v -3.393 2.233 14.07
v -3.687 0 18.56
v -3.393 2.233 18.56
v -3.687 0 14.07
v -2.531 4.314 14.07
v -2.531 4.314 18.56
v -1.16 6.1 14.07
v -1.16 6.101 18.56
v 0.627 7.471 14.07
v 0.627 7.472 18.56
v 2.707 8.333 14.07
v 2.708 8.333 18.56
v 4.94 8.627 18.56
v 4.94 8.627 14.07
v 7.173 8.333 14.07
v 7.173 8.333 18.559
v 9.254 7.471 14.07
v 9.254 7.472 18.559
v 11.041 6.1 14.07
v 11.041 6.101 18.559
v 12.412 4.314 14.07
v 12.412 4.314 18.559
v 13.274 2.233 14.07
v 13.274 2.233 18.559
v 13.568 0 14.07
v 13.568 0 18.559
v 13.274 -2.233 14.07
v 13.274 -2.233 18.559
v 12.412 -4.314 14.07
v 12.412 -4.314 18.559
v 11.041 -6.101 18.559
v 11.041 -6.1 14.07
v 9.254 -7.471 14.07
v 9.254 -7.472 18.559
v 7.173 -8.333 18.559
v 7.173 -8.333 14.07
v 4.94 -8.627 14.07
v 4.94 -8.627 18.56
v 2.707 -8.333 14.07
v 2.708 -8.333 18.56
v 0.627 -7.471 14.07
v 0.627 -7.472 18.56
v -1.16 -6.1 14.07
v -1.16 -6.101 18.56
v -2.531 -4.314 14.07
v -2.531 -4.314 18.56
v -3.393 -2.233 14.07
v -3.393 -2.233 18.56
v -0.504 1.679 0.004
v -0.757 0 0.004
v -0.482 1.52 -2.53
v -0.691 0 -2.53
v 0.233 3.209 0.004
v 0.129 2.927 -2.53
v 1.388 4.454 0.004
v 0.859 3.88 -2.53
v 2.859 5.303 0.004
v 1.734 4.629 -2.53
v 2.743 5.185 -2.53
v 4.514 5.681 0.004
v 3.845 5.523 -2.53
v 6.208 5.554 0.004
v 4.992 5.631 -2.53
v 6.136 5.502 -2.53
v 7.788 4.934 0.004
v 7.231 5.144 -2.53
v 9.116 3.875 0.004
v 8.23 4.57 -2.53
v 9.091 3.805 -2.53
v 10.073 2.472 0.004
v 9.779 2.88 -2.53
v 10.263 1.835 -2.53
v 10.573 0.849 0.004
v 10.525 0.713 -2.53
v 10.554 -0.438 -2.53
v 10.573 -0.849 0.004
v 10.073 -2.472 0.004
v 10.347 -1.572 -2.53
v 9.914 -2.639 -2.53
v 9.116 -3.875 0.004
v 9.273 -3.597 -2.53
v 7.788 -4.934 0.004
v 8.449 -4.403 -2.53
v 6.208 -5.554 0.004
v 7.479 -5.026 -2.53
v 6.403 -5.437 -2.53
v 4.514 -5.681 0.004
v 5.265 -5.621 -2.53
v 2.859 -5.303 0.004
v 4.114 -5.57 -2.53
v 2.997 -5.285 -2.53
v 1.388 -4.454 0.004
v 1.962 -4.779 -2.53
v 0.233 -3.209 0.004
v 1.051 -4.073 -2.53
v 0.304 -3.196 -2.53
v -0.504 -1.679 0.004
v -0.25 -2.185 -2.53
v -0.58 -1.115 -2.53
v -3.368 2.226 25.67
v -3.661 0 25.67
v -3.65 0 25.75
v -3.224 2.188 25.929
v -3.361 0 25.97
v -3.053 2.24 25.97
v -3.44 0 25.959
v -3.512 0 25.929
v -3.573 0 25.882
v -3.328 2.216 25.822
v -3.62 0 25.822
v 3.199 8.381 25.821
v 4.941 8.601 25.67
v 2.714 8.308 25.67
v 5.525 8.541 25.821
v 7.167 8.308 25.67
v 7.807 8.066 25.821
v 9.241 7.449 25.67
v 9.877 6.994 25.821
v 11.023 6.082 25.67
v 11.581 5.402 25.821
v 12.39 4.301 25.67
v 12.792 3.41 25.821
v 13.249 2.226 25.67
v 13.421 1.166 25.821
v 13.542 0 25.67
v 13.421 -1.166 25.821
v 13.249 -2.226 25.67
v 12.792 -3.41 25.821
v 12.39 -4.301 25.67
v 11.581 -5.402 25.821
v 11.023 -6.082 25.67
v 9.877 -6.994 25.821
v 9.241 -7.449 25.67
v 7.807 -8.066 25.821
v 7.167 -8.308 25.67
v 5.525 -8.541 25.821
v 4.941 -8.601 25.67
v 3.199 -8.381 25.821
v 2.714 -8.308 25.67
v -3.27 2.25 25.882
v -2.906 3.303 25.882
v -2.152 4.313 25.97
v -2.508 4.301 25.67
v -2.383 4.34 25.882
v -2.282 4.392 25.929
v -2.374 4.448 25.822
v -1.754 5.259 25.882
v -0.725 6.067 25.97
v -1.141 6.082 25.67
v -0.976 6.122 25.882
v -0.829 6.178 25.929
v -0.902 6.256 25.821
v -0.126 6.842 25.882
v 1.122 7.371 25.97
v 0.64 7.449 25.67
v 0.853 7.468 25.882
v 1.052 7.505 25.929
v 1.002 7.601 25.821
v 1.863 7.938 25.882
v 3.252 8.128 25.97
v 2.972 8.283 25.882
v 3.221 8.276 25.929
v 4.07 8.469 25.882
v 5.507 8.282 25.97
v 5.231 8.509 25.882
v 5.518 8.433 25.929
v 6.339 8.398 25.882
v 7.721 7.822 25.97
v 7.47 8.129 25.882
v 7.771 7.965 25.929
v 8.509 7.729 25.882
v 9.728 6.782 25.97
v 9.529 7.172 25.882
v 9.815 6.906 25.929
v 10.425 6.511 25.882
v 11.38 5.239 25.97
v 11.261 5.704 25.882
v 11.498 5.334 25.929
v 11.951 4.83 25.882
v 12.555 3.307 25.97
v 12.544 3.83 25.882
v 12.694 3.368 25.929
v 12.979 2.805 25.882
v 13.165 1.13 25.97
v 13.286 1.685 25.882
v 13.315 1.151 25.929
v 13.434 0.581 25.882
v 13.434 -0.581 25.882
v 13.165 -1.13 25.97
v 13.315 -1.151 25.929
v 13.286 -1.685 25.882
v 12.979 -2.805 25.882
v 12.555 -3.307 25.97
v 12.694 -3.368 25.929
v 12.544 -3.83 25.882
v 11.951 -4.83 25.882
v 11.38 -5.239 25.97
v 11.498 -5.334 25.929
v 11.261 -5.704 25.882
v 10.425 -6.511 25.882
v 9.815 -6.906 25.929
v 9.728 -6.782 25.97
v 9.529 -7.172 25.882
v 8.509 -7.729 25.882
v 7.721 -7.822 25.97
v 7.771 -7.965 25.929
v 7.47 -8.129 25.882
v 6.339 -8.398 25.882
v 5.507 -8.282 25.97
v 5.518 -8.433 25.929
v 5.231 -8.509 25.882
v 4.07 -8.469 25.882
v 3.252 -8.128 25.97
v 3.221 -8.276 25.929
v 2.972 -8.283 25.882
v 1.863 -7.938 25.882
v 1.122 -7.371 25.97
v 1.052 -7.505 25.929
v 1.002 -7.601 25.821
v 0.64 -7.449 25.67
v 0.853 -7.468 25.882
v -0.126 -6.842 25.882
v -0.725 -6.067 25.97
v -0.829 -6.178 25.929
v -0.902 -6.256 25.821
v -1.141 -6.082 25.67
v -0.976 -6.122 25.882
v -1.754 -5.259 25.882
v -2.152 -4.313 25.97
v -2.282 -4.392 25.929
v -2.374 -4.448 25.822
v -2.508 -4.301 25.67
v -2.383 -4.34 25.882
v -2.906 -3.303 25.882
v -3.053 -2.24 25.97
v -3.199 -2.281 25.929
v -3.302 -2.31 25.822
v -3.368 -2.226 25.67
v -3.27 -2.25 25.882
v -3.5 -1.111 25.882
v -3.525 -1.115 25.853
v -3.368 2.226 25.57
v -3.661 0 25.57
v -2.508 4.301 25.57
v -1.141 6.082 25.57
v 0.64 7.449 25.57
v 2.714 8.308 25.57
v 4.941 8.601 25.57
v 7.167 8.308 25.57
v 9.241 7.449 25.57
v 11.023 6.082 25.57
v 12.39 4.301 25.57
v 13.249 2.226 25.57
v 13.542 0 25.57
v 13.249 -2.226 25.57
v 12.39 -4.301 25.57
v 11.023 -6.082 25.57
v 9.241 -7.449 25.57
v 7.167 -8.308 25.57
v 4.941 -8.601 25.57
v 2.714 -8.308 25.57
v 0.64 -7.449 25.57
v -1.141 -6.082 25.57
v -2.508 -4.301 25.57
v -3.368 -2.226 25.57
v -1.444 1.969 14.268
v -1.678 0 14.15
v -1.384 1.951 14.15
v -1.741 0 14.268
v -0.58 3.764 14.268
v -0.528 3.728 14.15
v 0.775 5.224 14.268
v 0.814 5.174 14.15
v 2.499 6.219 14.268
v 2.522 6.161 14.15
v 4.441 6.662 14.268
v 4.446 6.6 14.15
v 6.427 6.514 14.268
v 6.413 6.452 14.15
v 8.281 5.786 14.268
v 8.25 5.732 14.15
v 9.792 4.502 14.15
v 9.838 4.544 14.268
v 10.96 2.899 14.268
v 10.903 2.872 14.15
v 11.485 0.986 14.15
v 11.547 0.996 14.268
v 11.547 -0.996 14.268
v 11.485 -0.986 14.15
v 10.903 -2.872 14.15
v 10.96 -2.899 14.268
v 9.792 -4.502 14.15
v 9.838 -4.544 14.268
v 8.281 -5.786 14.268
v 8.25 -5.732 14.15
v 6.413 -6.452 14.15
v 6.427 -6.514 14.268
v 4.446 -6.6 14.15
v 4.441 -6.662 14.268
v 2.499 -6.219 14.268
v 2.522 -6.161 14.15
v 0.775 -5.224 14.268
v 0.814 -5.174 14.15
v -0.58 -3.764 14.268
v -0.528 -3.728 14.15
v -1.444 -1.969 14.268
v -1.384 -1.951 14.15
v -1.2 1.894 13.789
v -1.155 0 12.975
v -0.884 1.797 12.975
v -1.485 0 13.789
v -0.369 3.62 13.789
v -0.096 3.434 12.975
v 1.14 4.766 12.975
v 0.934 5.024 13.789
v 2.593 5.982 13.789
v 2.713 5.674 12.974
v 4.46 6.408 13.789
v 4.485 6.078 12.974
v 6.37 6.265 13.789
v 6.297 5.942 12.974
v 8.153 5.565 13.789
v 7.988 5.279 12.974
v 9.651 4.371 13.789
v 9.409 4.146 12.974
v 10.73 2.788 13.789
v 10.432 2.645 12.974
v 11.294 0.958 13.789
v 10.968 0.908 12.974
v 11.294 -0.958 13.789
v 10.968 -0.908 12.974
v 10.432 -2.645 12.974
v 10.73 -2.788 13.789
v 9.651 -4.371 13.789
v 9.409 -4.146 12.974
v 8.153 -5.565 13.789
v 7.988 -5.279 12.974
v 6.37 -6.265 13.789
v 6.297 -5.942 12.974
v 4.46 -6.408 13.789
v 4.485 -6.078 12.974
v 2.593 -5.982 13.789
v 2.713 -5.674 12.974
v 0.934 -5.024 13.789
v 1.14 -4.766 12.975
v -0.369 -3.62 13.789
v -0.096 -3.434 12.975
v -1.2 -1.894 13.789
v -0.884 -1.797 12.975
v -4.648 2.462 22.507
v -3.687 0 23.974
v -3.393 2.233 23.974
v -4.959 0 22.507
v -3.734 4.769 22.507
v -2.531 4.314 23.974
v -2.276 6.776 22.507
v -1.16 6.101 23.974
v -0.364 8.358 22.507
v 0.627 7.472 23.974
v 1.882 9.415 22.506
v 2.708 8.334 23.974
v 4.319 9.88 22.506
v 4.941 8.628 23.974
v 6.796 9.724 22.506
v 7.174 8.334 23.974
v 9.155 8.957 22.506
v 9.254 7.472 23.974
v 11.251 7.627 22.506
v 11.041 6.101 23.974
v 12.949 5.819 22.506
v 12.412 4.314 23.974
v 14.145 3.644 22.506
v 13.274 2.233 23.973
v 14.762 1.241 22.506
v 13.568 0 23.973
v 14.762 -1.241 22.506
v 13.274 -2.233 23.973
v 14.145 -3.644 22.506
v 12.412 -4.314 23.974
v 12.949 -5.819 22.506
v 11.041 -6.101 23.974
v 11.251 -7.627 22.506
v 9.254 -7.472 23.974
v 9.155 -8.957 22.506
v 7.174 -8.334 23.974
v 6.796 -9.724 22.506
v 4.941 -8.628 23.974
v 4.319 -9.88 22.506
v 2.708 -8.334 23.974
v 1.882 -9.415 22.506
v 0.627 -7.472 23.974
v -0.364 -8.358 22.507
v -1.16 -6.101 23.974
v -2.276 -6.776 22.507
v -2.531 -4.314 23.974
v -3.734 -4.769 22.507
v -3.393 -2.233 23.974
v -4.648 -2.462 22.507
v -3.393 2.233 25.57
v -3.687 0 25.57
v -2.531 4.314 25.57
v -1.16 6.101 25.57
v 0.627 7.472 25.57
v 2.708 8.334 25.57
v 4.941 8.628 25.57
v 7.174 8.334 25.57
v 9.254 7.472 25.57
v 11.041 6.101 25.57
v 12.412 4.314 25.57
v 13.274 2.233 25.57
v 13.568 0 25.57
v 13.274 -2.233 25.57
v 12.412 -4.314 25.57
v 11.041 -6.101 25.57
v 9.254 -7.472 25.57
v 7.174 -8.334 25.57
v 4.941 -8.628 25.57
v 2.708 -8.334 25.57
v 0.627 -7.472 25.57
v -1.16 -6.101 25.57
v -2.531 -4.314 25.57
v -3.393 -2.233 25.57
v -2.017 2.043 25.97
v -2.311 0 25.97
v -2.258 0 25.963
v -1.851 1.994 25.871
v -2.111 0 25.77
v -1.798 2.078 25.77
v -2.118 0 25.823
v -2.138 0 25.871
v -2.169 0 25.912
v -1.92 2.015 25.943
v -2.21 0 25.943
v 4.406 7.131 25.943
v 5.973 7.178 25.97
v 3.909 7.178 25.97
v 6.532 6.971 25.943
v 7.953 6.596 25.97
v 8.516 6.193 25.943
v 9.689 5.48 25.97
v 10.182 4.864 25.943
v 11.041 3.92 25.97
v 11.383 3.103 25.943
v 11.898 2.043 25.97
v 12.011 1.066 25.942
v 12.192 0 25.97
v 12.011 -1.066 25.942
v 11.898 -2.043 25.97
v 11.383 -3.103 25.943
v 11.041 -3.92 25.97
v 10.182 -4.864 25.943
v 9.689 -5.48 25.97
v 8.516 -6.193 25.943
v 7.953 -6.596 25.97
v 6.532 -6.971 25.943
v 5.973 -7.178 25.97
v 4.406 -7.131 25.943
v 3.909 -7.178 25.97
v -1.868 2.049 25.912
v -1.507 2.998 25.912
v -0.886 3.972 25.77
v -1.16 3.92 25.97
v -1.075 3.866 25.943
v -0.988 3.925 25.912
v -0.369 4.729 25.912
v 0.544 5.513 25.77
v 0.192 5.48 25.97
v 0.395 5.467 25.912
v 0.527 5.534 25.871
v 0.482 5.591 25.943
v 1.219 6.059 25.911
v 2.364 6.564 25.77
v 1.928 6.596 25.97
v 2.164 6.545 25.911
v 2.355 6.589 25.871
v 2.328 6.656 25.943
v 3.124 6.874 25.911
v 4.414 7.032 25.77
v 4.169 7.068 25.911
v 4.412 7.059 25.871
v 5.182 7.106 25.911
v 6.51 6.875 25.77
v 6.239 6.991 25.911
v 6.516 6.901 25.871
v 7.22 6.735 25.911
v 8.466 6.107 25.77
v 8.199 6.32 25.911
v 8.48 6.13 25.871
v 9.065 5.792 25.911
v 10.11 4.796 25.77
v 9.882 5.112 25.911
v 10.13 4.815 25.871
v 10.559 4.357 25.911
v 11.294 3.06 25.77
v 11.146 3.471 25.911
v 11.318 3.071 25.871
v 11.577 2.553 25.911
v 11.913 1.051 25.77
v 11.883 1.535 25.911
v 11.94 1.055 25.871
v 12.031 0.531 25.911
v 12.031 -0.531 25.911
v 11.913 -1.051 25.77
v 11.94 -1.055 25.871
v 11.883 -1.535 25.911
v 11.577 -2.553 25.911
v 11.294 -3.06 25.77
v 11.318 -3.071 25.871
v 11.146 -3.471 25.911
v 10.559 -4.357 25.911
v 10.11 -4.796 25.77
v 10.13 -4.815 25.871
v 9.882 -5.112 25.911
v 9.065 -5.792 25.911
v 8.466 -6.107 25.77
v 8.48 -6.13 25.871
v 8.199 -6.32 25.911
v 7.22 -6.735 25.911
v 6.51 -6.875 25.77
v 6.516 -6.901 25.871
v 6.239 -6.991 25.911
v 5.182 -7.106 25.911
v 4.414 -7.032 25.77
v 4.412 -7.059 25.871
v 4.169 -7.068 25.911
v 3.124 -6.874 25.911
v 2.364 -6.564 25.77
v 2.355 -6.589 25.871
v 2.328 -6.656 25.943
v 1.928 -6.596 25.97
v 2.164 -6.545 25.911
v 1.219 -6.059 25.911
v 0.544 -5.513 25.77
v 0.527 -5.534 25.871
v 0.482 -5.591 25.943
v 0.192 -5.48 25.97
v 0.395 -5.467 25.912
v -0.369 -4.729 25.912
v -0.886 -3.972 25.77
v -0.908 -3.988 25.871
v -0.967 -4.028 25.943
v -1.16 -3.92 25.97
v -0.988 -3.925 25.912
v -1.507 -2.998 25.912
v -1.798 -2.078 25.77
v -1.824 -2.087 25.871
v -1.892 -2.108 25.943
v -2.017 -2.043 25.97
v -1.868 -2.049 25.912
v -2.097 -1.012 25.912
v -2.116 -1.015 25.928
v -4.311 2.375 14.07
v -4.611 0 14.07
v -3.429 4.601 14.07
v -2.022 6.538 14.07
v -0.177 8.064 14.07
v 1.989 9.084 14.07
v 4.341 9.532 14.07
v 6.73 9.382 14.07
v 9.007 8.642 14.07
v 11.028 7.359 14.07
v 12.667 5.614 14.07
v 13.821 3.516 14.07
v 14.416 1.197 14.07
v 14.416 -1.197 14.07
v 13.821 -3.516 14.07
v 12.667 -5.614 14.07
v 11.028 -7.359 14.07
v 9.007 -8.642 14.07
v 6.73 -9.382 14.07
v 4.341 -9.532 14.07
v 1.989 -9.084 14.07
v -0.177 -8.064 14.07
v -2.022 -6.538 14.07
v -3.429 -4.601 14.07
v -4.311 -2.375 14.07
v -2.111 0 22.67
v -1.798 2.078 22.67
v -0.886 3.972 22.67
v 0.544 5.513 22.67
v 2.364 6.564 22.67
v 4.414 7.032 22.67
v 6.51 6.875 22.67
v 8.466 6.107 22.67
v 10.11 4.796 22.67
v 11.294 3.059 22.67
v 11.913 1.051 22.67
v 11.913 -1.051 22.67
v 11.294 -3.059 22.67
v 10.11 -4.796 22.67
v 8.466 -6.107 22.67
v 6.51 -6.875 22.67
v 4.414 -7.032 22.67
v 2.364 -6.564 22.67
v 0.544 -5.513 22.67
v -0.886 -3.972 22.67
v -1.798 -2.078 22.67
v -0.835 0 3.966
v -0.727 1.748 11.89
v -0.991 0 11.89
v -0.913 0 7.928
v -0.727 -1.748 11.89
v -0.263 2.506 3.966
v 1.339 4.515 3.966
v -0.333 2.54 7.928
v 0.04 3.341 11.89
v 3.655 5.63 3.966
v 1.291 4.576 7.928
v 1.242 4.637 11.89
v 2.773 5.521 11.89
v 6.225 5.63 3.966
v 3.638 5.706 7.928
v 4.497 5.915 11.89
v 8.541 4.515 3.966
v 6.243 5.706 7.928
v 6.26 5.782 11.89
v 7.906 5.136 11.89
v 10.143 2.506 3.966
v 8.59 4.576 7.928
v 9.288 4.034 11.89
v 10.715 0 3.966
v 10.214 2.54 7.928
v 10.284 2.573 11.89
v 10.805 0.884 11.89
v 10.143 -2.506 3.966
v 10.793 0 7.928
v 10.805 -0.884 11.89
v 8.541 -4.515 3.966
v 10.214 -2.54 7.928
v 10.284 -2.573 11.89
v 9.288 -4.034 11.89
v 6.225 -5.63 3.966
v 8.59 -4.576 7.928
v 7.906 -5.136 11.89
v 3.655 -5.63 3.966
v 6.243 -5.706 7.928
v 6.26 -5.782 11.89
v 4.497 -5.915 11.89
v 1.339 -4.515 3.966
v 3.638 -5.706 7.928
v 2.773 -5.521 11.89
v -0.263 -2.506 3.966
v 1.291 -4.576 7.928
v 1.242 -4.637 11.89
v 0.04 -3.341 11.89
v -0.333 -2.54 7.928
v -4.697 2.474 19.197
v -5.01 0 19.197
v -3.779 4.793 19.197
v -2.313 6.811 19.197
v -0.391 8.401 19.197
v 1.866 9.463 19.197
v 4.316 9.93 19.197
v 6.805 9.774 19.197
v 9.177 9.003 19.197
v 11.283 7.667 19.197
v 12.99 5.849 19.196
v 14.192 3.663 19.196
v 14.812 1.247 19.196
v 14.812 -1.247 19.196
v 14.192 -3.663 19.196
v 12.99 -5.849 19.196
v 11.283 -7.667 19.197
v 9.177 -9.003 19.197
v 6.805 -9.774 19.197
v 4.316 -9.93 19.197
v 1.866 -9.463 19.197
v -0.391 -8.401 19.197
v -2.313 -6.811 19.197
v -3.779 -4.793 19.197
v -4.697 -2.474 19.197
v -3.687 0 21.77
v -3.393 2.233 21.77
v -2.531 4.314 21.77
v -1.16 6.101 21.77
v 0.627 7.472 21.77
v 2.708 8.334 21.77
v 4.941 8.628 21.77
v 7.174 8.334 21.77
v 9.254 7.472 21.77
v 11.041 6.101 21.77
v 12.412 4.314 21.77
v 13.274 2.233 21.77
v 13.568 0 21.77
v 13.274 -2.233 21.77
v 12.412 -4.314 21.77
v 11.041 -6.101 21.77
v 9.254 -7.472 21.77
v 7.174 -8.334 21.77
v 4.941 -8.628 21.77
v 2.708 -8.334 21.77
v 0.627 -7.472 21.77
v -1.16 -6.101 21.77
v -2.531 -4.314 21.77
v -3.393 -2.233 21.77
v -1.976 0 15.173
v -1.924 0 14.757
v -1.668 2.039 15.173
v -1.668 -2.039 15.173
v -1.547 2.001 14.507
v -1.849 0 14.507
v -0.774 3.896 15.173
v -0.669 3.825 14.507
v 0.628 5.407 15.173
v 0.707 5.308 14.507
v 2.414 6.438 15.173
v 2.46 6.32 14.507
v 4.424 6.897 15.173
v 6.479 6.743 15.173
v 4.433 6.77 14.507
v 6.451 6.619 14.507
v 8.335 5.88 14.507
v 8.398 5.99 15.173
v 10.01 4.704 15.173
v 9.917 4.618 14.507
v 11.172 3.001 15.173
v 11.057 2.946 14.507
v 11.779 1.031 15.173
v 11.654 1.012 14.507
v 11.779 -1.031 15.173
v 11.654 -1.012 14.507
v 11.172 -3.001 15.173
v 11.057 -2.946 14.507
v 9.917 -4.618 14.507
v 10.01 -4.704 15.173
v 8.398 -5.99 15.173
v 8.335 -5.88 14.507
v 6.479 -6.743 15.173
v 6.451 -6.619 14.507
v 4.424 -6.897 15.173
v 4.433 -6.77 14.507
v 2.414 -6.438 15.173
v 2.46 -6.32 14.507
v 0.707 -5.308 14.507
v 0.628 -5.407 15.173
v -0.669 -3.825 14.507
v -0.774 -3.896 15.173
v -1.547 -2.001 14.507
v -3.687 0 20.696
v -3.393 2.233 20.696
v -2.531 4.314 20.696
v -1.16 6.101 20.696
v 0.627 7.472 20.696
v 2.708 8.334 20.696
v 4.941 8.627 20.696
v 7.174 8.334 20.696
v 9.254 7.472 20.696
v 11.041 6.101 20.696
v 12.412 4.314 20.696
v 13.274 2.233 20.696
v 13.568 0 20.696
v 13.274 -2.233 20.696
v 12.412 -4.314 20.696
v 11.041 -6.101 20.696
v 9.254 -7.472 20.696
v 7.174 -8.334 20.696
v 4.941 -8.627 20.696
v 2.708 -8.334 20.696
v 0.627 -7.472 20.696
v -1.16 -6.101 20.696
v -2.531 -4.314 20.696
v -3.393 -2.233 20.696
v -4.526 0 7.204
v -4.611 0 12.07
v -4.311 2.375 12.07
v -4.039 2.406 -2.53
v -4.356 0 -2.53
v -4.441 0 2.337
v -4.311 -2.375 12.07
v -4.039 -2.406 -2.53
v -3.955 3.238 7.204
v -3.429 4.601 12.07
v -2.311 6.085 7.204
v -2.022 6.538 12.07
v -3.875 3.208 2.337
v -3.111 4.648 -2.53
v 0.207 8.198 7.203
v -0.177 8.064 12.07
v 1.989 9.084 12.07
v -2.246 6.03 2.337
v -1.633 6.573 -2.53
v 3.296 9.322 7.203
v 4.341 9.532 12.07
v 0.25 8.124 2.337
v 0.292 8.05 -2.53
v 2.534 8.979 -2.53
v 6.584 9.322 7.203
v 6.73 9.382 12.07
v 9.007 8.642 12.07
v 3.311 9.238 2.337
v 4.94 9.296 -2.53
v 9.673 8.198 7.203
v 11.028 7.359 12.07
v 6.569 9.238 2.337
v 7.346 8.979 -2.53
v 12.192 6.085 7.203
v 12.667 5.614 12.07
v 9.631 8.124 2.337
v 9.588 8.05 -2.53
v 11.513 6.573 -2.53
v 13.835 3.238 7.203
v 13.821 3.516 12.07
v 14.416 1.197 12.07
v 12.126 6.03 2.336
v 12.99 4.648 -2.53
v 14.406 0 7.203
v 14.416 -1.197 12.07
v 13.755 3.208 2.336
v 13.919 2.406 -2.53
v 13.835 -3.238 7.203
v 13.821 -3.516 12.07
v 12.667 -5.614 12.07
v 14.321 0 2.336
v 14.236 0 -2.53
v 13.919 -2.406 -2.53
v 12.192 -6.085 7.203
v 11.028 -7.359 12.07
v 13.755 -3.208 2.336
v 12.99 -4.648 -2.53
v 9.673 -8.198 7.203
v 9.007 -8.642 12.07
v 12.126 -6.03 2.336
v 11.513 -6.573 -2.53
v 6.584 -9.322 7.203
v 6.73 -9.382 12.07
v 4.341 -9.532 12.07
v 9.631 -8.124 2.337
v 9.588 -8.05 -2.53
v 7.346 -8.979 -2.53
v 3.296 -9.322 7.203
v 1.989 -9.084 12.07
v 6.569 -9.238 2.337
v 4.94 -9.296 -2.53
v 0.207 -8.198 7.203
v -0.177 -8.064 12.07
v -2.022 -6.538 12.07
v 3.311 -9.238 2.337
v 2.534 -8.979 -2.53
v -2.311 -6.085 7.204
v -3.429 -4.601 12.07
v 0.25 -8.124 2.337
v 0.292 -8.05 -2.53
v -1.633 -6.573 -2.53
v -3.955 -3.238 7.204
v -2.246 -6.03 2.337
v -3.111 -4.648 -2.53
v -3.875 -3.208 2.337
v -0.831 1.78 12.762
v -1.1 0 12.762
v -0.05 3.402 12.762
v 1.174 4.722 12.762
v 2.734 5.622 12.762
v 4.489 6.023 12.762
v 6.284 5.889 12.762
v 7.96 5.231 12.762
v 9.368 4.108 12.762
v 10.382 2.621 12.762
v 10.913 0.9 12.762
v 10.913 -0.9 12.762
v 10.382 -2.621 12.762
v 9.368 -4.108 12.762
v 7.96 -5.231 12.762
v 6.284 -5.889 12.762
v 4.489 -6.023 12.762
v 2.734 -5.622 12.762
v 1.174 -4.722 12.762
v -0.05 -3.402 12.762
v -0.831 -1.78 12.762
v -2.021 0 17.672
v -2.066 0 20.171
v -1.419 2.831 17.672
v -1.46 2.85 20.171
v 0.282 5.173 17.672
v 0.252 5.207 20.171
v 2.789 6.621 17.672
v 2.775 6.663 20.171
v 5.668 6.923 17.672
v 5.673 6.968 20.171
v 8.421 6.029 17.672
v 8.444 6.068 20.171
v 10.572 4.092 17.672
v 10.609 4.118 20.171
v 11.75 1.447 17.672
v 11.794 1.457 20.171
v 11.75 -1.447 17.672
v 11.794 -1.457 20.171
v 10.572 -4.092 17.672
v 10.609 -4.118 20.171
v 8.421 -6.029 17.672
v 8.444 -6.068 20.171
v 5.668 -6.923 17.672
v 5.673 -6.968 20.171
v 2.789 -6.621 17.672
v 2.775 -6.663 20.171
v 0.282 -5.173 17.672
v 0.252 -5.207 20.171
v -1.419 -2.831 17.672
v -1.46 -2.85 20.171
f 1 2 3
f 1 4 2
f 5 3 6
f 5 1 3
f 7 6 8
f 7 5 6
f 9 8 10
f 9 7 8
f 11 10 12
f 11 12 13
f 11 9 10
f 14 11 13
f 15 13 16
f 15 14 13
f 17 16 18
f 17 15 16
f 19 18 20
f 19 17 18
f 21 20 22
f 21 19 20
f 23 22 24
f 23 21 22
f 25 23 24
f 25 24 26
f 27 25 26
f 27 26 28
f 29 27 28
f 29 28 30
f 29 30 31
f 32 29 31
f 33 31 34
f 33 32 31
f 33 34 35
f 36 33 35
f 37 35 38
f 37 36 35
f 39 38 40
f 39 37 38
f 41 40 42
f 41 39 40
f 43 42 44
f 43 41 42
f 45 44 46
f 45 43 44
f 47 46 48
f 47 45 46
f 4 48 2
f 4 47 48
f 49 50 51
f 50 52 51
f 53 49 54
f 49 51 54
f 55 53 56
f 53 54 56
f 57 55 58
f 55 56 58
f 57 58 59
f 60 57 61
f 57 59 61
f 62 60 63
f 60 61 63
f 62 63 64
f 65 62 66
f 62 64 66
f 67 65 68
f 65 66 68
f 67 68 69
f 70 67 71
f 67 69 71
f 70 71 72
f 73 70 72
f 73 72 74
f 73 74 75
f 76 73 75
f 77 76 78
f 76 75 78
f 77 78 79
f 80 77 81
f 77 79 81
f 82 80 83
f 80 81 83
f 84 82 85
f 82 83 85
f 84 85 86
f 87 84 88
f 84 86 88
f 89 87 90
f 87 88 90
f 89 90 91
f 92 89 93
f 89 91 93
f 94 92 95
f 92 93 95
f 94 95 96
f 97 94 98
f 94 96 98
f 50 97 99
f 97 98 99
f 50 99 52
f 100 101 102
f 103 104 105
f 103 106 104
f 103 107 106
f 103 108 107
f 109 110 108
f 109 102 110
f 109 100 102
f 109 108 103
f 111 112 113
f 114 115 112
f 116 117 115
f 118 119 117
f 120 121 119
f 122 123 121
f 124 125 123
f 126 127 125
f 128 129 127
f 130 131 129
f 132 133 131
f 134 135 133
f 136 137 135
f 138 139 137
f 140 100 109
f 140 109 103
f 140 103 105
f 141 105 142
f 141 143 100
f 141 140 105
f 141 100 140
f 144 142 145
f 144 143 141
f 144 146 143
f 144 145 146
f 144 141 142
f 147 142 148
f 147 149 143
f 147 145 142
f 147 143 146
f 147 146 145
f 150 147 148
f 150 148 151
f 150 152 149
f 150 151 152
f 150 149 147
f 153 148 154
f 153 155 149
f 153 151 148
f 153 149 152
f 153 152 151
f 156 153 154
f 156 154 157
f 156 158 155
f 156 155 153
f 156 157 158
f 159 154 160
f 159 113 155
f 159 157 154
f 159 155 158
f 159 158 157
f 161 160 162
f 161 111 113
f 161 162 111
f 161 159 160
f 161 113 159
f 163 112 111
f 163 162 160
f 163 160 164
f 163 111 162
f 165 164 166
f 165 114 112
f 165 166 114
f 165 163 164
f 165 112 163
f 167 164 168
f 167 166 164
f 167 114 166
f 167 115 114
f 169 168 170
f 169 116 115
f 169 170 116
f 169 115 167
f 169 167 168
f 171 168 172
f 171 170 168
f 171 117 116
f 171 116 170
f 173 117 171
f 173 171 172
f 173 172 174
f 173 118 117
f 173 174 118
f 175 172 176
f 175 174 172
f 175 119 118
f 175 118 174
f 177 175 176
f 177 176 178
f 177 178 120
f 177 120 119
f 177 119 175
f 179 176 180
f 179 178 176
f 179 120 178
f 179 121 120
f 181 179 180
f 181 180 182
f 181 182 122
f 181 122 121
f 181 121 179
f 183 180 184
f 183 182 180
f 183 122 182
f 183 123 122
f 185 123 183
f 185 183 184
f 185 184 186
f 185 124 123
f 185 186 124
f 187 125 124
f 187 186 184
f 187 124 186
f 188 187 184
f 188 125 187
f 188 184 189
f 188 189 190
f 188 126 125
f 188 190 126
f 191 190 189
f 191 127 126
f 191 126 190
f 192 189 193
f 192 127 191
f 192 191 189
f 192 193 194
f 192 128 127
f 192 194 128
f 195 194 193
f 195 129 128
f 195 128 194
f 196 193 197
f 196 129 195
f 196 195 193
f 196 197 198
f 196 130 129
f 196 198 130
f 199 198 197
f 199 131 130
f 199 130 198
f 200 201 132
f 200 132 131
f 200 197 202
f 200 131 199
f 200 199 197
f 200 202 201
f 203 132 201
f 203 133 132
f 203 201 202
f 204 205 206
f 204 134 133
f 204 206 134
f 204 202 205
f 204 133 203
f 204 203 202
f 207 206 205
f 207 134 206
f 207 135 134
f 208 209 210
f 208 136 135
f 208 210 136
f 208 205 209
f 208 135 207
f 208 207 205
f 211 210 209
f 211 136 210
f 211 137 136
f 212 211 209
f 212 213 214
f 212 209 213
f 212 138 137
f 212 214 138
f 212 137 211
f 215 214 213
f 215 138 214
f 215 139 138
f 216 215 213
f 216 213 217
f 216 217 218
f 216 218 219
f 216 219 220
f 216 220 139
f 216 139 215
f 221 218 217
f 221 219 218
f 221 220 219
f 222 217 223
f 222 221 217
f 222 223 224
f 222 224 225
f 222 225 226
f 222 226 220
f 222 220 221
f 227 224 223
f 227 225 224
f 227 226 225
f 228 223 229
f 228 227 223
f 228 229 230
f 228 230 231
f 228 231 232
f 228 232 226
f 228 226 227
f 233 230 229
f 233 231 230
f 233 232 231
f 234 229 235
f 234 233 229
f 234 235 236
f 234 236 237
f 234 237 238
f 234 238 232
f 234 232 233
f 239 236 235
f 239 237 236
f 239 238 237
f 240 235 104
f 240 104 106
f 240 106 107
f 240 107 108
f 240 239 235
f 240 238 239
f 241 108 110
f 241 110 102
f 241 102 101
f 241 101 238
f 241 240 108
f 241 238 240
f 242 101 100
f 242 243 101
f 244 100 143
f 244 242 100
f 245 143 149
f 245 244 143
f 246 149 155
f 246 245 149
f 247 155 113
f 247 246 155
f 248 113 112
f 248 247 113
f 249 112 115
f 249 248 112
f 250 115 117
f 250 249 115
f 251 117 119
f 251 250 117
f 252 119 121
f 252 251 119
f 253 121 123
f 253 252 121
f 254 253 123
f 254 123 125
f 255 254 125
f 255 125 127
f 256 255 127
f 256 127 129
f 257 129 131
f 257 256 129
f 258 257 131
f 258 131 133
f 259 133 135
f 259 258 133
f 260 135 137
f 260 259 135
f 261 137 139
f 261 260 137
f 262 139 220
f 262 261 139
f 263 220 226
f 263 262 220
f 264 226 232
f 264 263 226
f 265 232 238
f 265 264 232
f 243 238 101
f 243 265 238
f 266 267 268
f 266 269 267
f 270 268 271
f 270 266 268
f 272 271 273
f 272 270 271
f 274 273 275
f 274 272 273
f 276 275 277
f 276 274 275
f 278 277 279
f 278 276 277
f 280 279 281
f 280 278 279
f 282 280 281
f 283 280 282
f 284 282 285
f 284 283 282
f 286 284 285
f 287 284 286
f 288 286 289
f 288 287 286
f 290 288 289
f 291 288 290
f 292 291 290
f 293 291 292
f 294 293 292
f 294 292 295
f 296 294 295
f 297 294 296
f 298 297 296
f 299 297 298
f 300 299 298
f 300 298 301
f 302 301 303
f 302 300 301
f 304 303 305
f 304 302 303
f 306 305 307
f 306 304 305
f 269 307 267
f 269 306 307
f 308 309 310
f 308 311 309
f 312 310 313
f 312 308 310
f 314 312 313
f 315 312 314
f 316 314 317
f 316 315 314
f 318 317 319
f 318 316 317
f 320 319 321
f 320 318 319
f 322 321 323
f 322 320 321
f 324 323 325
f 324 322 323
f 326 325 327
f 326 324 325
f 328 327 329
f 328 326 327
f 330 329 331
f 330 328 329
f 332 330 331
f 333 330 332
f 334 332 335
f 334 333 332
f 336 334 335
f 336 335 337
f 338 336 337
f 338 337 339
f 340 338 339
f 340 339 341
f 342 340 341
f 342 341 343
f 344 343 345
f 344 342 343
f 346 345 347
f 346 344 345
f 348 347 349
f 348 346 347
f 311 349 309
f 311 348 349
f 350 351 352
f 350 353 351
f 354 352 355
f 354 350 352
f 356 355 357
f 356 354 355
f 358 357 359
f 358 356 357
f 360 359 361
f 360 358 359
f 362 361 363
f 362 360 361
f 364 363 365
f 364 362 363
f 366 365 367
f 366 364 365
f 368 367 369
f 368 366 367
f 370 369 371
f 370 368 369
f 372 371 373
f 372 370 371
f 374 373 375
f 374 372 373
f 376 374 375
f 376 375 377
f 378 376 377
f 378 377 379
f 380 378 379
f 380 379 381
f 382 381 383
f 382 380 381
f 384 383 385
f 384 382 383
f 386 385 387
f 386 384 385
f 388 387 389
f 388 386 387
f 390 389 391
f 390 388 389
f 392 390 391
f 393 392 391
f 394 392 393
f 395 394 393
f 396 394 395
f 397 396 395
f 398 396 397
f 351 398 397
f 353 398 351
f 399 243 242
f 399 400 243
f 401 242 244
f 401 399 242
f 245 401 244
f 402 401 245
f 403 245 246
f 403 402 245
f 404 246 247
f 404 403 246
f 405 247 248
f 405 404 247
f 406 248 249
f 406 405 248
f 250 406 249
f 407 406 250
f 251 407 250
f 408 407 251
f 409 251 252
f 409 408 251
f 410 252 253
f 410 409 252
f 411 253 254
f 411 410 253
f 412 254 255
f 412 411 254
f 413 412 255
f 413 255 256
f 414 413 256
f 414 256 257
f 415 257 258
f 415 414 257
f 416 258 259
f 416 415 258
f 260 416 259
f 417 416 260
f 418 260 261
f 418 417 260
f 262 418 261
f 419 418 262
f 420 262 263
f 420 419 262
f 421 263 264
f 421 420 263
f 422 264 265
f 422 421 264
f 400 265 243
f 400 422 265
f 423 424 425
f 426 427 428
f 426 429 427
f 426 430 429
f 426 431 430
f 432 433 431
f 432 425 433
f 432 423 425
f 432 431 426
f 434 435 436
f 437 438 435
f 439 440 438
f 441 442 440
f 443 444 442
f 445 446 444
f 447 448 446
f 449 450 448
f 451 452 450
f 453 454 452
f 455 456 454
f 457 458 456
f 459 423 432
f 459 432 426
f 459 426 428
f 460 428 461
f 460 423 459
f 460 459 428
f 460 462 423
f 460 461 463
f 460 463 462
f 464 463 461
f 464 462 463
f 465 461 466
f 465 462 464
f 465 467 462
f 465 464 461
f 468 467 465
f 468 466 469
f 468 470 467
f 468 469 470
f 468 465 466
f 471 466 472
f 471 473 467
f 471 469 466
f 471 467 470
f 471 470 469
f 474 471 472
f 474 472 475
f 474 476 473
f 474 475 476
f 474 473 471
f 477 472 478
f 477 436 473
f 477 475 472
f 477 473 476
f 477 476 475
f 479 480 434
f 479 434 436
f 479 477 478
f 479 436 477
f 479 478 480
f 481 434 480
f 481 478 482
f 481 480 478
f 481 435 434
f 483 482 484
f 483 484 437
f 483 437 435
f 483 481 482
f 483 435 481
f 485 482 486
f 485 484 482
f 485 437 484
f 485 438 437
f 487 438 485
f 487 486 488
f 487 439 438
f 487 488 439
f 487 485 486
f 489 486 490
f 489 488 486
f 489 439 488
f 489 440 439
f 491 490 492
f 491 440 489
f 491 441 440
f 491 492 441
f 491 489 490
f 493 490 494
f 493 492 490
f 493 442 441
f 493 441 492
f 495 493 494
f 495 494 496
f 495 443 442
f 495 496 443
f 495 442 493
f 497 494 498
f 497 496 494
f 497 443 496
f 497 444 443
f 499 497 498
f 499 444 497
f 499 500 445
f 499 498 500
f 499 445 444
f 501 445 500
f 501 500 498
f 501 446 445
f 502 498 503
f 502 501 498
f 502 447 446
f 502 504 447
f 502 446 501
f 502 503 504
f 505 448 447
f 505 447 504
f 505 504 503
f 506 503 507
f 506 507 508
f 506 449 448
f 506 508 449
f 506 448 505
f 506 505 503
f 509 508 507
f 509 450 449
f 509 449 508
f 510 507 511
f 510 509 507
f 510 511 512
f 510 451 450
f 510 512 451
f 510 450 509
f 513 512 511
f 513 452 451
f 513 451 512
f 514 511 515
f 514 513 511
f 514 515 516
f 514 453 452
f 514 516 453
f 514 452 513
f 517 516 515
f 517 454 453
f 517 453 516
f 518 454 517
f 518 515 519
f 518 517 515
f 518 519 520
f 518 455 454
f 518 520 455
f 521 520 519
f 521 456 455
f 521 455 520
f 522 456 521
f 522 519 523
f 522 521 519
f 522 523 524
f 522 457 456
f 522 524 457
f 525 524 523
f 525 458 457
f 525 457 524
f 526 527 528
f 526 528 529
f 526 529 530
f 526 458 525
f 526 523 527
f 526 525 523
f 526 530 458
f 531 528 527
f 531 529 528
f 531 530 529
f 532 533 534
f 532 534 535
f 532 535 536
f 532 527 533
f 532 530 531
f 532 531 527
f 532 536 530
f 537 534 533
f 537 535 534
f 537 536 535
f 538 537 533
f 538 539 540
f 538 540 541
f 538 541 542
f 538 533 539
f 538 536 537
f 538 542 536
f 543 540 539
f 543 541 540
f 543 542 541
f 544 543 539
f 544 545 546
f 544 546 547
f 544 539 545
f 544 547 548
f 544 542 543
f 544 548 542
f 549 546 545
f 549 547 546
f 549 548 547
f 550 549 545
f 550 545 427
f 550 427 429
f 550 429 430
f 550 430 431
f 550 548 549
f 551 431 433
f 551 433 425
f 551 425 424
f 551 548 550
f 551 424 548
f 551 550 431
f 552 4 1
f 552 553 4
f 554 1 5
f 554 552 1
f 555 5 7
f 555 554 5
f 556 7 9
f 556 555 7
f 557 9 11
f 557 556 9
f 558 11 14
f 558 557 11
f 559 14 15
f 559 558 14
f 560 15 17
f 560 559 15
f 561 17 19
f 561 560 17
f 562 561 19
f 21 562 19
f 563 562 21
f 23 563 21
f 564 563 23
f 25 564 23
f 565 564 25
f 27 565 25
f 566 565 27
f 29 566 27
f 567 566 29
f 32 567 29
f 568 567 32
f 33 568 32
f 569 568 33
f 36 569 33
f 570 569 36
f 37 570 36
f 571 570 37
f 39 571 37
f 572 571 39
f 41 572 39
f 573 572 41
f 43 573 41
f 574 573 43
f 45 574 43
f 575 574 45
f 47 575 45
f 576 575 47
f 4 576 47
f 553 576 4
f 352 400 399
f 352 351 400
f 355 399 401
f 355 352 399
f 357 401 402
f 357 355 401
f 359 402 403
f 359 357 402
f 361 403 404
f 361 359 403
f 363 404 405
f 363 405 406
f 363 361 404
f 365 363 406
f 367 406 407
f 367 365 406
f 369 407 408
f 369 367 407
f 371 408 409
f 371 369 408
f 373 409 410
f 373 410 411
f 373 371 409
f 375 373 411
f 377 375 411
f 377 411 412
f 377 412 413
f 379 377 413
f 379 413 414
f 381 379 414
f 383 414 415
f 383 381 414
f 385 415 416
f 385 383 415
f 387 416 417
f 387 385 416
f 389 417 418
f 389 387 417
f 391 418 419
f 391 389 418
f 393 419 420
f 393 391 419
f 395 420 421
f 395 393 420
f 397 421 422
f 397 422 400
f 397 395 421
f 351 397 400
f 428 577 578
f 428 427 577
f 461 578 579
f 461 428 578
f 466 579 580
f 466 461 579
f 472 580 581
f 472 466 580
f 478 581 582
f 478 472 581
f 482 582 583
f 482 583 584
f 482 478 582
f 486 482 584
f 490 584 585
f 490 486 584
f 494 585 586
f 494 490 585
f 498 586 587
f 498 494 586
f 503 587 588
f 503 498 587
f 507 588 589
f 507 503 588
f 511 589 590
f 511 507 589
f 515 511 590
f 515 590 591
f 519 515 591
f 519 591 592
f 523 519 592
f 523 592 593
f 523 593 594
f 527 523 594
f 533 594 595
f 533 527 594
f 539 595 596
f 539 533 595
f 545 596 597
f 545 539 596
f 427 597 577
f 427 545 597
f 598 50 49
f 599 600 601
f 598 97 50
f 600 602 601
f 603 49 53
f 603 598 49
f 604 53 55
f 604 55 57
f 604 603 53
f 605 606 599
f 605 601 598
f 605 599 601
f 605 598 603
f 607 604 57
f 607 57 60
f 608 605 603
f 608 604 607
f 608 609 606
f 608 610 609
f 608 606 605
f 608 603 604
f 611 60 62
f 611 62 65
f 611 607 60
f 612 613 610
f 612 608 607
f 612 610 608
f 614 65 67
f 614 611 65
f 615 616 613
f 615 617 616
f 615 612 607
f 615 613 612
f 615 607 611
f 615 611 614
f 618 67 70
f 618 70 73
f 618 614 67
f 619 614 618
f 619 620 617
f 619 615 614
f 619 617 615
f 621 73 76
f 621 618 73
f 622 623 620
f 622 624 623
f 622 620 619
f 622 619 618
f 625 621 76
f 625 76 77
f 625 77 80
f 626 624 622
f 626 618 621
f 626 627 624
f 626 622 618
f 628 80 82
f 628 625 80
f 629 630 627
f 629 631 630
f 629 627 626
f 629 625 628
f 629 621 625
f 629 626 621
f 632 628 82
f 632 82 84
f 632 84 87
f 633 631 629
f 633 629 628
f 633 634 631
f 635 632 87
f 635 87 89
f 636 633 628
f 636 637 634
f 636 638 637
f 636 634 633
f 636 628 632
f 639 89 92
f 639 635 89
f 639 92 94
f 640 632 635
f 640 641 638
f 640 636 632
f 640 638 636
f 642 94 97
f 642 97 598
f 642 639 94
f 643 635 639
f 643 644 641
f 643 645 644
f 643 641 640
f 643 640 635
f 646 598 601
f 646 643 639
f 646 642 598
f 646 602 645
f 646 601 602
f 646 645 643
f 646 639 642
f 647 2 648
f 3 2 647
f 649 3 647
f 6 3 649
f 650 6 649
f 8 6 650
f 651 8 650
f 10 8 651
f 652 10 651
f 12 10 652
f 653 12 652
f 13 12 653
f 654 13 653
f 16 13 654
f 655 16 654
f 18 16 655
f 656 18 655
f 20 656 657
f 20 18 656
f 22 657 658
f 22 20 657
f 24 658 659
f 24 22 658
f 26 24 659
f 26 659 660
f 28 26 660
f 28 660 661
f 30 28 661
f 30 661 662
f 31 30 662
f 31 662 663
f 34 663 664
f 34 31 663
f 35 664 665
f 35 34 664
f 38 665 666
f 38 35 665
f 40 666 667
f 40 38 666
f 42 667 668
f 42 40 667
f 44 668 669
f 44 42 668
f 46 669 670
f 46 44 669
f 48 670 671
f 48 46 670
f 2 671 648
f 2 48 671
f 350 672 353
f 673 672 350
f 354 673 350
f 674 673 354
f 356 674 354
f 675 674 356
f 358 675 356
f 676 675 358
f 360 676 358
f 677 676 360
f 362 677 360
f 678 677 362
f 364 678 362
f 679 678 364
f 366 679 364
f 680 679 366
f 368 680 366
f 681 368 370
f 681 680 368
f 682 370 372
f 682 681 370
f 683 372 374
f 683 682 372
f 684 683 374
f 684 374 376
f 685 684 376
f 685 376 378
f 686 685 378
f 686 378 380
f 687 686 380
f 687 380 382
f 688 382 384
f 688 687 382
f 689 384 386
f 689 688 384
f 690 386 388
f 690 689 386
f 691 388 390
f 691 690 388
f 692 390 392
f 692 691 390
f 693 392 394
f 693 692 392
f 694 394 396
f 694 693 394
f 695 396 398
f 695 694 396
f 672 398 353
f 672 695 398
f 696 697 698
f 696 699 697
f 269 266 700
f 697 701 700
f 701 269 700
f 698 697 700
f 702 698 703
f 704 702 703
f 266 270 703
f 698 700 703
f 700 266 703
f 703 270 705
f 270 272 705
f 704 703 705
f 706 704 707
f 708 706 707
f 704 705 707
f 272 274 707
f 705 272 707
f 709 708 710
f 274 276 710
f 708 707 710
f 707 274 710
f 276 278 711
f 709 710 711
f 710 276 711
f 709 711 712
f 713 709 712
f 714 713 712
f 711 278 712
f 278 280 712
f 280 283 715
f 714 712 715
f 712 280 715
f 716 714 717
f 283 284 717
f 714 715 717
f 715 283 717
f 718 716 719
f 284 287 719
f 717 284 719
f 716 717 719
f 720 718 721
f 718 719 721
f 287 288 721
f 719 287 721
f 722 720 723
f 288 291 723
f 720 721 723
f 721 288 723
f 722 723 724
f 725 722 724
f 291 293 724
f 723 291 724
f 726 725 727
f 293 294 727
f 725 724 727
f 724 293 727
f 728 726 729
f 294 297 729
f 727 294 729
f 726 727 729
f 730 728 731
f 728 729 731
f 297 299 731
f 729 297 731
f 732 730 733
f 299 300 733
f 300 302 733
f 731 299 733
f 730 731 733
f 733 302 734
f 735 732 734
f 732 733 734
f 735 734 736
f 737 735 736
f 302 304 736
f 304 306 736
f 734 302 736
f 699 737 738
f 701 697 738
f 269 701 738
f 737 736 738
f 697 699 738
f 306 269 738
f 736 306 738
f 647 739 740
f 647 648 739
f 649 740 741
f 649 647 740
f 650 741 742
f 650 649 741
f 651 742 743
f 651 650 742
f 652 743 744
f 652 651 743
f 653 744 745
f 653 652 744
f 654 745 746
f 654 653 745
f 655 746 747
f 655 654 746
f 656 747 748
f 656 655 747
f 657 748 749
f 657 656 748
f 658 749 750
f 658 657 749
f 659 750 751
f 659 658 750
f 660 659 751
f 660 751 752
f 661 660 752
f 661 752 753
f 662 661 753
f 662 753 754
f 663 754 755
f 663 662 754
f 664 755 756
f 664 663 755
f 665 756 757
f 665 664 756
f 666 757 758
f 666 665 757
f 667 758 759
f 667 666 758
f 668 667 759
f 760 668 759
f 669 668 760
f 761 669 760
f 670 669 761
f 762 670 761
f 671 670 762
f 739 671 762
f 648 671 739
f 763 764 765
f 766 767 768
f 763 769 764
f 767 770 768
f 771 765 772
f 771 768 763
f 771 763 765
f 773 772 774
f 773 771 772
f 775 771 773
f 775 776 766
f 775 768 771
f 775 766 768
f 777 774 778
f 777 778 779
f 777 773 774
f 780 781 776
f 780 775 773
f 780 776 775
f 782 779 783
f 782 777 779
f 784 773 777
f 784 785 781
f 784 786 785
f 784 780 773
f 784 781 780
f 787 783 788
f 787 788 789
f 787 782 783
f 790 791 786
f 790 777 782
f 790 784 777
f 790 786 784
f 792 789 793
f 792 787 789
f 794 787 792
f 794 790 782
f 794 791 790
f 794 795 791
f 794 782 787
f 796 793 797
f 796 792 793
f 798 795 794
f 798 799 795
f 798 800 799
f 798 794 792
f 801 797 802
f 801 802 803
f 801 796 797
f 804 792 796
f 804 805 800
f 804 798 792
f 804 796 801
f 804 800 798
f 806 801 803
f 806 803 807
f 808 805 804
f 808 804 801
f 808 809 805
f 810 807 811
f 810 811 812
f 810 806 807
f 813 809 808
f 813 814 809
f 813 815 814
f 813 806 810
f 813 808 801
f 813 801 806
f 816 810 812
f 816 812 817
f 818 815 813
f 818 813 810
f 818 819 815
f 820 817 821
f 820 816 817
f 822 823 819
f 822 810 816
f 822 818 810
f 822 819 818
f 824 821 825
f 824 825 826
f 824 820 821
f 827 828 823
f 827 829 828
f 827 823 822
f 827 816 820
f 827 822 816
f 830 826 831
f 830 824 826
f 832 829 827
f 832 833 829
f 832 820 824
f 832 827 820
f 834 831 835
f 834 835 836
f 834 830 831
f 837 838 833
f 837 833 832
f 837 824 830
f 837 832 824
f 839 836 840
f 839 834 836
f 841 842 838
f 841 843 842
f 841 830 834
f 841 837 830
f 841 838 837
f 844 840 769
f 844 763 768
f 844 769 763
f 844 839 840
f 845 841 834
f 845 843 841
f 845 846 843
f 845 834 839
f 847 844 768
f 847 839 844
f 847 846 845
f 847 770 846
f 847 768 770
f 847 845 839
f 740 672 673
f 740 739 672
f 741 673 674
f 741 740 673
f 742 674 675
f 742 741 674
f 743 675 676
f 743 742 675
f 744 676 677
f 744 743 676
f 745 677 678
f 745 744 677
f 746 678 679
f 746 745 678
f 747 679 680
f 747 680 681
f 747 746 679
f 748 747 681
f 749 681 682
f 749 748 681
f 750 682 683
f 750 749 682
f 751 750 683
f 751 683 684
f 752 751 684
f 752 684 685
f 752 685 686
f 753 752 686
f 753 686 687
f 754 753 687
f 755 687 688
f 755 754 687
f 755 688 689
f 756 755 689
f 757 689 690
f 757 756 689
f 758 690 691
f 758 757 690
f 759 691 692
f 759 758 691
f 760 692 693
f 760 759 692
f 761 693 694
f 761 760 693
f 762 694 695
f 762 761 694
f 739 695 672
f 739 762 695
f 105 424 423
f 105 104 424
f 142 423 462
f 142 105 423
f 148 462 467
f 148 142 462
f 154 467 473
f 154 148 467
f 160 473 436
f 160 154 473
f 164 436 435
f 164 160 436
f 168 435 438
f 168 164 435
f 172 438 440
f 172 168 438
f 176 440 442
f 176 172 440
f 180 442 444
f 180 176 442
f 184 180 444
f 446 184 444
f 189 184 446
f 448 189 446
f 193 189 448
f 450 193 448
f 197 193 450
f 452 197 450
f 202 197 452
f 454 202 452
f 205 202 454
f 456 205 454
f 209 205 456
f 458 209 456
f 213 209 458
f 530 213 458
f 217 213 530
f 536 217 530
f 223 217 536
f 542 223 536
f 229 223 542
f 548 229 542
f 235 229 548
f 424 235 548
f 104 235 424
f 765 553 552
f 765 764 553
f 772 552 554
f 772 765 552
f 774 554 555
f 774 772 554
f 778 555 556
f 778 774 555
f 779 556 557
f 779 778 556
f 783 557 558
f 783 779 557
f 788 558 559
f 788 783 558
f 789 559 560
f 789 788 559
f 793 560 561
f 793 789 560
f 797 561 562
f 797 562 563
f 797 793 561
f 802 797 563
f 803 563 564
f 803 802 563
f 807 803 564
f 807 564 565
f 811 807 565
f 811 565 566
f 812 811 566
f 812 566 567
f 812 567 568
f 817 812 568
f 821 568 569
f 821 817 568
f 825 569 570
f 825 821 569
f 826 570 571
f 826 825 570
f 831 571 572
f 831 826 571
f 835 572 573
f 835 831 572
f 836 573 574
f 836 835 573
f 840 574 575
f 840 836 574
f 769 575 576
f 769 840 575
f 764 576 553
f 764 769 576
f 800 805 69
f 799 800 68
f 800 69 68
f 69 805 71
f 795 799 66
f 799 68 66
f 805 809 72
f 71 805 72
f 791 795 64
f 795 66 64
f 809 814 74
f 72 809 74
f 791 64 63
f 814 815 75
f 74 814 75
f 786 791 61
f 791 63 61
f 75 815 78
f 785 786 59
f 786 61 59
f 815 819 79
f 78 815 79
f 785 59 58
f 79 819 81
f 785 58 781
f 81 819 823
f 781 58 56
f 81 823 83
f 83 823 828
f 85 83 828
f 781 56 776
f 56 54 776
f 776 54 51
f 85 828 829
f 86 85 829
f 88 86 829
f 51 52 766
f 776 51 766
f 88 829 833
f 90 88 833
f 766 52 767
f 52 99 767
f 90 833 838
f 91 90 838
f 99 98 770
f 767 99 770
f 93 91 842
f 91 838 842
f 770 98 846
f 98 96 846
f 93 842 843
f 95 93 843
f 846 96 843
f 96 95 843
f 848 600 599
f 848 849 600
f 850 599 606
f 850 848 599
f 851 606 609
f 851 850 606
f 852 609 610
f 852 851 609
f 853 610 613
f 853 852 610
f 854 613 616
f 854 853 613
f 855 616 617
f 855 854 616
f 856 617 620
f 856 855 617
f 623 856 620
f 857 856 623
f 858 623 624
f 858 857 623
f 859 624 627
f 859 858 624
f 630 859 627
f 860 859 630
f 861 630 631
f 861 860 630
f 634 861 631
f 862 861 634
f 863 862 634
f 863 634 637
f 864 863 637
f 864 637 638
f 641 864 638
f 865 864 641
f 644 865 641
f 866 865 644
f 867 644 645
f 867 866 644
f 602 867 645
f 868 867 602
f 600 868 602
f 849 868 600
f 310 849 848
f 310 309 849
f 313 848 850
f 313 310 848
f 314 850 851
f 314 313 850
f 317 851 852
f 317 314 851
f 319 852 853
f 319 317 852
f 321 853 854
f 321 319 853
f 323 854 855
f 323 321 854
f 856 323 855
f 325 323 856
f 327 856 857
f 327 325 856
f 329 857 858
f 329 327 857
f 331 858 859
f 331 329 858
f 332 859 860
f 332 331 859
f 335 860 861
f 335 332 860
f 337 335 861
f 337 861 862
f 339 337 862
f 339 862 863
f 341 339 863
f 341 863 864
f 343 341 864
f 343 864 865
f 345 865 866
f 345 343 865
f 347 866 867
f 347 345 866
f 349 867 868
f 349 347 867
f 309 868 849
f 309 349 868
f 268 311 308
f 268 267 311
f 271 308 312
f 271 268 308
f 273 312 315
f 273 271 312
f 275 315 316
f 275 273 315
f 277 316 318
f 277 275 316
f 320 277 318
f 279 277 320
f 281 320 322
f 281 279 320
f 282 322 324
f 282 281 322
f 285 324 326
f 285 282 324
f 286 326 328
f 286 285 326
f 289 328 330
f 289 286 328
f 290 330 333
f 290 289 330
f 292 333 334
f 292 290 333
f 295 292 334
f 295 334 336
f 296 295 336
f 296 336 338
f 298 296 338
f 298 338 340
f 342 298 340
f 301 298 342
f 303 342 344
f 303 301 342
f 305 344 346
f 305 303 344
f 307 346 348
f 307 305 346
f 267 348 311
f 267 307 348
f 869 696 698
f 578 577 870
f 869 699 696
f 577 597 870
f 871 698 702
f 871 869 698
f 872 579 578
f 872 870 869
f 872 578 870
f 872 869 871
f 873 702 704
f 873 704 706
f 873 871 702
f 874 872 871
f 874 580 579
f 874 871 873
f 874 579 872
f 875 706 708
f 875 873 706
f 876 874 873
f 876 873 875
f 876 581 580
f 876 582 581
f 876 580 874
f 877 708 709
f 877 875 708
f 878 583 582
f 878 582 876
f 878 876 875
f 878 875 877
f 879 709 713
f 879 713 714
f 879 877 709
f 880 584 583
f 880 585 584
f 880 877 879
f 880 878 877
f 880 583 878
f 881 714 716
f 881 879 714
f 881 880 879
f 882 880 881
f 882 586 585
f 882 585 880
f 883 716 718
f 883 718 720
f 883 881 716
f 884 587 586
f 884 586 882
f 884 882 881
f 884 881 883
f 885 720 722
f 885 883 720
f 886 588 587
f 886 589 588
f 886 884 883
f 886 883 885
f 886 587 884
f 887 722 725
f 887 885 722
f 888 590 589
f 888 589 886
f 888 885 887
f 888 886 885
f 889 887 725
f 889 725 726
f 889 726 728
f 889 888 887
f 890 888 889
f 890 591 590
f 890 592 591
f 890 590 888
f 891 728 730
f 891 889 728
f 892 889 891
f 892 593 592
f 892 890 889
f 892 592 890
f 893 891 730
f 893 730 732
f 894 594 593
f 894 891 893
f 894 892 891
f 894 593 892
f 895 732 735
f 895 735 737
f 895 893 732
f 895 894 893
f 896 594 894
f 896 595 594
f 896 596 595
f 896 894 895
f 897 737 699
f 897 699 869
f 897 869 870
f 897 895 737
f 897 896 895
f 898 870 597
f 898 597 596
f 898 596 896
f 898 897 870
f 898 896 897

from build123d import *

# Parameters (mm, degrees)
F4_DEPTH      = 9.9510698867
F4_DEPTH_BACK = 9.9510698867


# Not quite as in the source:
# - ends of sketch curves that miss each other by under 0.0002 mm in the source are joined


with BuildPart() as f2:
    # F1 (on Front) → F2 (revolve)
    with BuildSketch(Plane.XZ):
        with BuildLine():
            Line((-0.756877, 0.003809), (-0.990799, 11.890078))
            add(Edge.make_bspline(
                [(-0.990799, 11.890078), (-0.996484, 12.183944), (-1.033002, 12.476088), (-1.099664, 12.762376)],
                knots=[0, 0, 0, 0, 1, 1, 1, 1], degree=3))
            add(Edge.make_bspline(
                [(-1.099664, 12.762376), (-1.116201, 12.833345), (-1.134632, 12.904314), (-1.154958, 12.974594)],
                knots=[0, 0, 0, 0, 1, 1, 1, 1], degree=3))
            add(Edge.make_bspline(
                [(-1.154958, 12.974594), (-1.236435, 13.256747), (-1.347022, 13.529943), (-1.485343, 13.789014)],
                knots=[0, 0, 0, 0, 1, 1, 1, 1], degree=3))
            Line((-1.485343, 13.789014), (-1.677924, 14.15006))
            Line((-1.677924, 14.15006), (-1.740797, 14.267883))
            add(Edge.make_bspline(
                [(-1.975752, 15.173254), (-1.970068, 14.856994), (-1.889625, 14.546935), (-1.740797, 14.267883)],
                knots=[0, 0, 0, 0, 1, 1, 1, 1], degree=3))
            Line((-1.975752, 15.173254), (-2.1108, 22.670126))
            Line((-2.1108, 22.670126), (-2.1108, 25.770023))
            add(Edge.make_bspline(
                [(-2.1108, 25.770023), (-2.1108, 25.88061), (-2.200372, 25.970183), (-2.310788, 25.970183)],
                knots=[0, 0, 0, 0, 1, 1, 1, 1], degree=3))
            Line((-2.310788, 25.970183), (-3.360681, 25.970183))
            add(Edge.make_bspline(
                [(-3.360681, 25.970183), (-3.52639, 25.970183), (-3.660748, 25.835824), (-3.660748, 25.670115)],
                knots=[0, 0, 0, 0, 1, 1, 1, 1], degree=3))
            Line((-3.660748, 25.670115), (-3.660748, 25.570207))
            Line((-3.660748, 25.570207), (-3.686931, 25.570207))
            Line((-3.686931, 25.570207), (-3.686931, 23.973922))
            Line((-3.686931, 23.973922), (-4.958556965, 22.5066486746))
            Line((-4.958556965, 22.5066486746), (-3.686931, 21.7700749636))
            Line((-3.686931, 21.7700749636), (-3.686931, 20.6960067153))
            Line((-3.686931, 20.6960067153), (-5.0095622428, 19.196934998))
            Line((-5.0095622428, 19.196934998), (-3.686931, 18.559782))
            Line((-3.686931, 18.559782), (-3.686931, 14.070306))
            Line((-3.686931, 14.070306), (-4.610733, 14.070306))
            Line((-4.610733, 14.070306), (-4.610733, 12.070256))
            Line((-4.610733, 12.070256), (-3.952894, -25.626775))
            ThreePointArc((-3.952894, -25.626775), (-3.2274904136, -27.9992970945), (-1.3549908614, -29.6268157026))
            Line((-1.3549908614, -29.6268157026), (1.23835, -30.835824))
            Line((1.23835, -30.835824), (1.660891, -30.929703))
            Line((1.660891, -30.929703), (2.028138, -30.929703))
            ThreePointArc((2.028138, -30.929703), (2.6539813799, -31.1498802042), (3.004306, -31.71329))
            Line((3.004306, -31.71329), (3.939132, -35.929743))
            Line((3.939132, -35.929743), (4.939071, -35.929743))
            Line((4.939071, -35.929743), (4.939243, -29.329801))
            Line((4.939243, -29.329801), (2.98553, -29.329801))
            add(Edge.make_bspline(
                [(2.732488, -29.297417), (2.814998, -29.318777), (2.900091, -29.329801), (2.98553, -29.329801)],
                knots=[0, 0, 0, 0, 1, 1, 1, 1], degree=3))
            add(Edge.make_bspline(
                [(2.67082, -29.278813), (2.691146, -29.285704), (2.711645, -29.291905), (2.732488, -29.297417)],
                knots=[0, 0, 0, 0, 1, 1, 1, 1], degree=3))
            add(Edge.make_bspline(
                [(2.44086, -29.16857), (2.512346, -29.215079), (2.589688, -29.251942), (2.67082, -29.278813)],
                knots=[0, 0, 0, 0, 1, 1, 1, 1], degree=3))
            Line((2.44086, -29.16857), (1.451946, -28.526405))
            add(Edge.make_bspline(
                [(0.087515, -26.109326), (0.119899, -27.0898), (0.629429, -27.99207), (1.451946, -28.526405)],
                knots=[0, 0, 0, 0, 1, 1, 1, 1], degree=3))
            Line((0.087515, -26.109326), (-0.686597, -2.663039))
            add(Edge.make_bspline(
                [(-0.756877, 0.003809), (-0.73948, -0.88537), (-0.716053, -1.774205), (-0.686597, -2.663039)],
                knots=[0, 0, 0, 0, 1, 1, 1, 1], degree=3))
        make_face()
    revolve(axis=Axis((4.939157, 0, -32.629772), (-2.60608e-05, 0, -0.9999999997)))

    # F3 (on Front) → F4 (cut, two sides)
    with BuildSketch(Plane.XZ) as f4_sk:
        Polygon((-27.1517578705, -2.5291696333), (-27.1517578705, -48.2453077242), (32.6887033687, -48.2453077242), (32.6887033687, -2.5307291257), align=None)
    extrude(amount=-F4_DEPTH, mode=Mode.SUBTRACT)
    extrude(f4_sk.sketch, amount=F4_DEPTH_BACK, mode=Mode.SUBTRACT)


solid = f2.part
